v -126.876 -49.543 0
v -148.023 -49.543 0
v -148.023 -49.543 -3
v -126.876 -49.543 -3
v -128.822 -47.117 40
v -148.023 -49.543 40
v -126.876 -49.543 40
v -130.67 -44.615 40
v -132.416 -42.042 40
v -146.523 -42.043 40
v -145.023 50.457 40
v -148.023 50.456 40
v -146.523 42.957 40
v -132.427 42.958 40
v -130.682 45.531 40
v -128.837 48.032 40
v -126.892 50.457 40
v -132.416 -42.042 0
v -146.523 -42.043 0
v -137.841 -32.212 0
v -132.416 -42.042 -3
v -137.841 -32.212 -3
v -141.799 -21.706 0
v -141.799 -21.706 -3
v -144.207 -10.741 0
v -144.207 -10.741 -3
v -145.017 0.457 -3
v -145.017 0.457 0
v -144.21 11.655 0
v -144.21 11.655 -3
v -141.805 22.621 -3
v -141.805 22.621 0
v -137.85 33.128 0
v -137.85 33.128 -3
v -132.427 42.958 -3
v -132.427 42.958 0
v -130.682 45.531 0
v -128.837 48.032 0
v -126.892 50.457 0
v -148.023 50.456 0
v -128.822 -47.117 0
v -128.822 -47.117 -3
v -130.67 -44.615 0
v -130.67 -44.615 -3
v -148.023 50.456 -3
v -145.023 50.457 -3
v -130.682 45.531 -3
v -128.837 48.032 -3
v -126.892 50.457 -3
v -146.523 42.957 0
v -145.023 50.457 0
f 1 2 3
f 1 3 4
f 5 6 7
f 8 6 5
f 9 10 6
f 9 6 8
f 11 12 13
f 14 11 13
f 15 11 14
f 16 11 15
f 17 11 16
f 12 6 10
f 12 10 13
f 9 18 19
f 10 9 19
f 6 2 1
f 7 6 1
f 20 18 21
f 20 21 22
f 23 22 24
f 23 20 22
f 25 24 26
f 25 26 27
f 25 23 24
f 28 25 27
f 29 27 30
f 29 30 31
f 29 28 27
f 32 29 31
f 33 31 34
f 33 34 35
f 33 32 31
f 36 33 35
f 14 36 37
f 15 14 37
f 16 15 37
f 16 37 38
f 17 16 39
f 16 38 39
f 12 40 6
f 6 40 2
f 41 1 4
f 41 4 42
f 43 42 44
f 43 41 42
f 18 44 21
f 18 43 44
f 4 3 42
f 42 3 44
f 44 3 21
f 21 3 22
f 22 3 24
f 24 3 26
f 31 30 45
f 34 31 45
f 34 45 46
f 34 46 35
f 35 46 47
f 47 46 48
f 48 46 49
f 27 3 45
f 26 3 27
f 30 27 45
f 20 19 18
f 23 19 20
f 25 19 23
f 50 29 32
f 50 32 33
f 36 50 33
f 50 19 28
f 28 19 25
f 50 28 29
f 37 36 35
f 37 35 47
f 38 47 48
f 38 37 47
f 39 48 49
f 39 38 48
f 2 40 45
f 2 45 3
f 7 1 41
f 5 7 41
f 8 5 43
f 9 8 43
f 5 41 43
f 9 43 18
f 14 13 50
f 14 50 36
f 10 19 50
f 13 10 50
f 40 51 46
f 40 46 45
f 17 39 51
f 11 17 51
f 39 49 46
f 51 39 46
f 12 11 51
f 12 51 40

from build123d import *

# Parameters (mm, degrees)
F1_DEPTH = 3
F2_DEPTH = 40


with BuildPart() as f1:
    # F0 (on Top) → F1 (new body)
    with BuildSketch(Plane.XY):
        with BuildLine():
            Line((-126.8924768851, 50.456767044), (-145.0232239954, 50.456767044))
            Line((-145.0232239954, 50.456767044), (-146.5232239827, 50.4565720597))
            Line((-146.5232239827, 50.4565720597), (-146.5232239827, 42.9567671074))
            Line((-146.5232239827, 42.9567671074), (-132.4272471595, 42.958404326))
            ThreePointArc((-132.4272471595, 42.958404326), (-129.7719511525, 46.7903220915), (-126.8924768851, 50.456767044))
        make_face()
        Polygon((-146.5232239827, 42.9567671074), (-146.5232239827, 50.4565720597), (-148.02322397, 50.4563770754), (-148.02322397, -49.5432321111), (-146.5232239827, -49.5432321111), (-146.5232239827, -42.0432321745), align=None)
        with BuildLine():
            Line((-145.0102250409, -49.5432321111), (-126.8755409492, -49.5432321111))
            ThreePointArc((-126.8755409492, -49.5432321111), (-129.7580814774, -45.8752925216), (-132.4161980482, -42.0415949559))
            Line((-132.4161980482, -42.0415949559), (-146.5232239827, -42.0432321745))
            Line((-146.5232239827, -42.0432321745), (-146.5232239827, -49.5432321111))
            Line((-146.5232239827, -49.5432321111), (-145.0102250409, -49.5432321111))
        make_face()
        with BuildLine():
            ThreePointArc((-132.4161980482, -42.0415949559), (-145.0167245182, 0.4567674665), (-132.4272471595, 42.958404326))
            Line((-132.4272471595, 42.958404326), (-146.5232239827, 42.9567671074))
            Line((-146.5232239827, 42.9567671074), (-146.5232239827, -42.0432321745))
            Line((-146.5232239827, -42.0432321745), (-132.4161980482, -42.0415949559))
        make_face()
    extrude(amount=-F1_DEPTH)

    # F0 (on Top) → F2 (join)
    with BuildSketch(Plane.XY):
        with BuildLine():
            Line((-126.8924768851, 50.456767044), (-145.0232239954, 50.456767044))
            Line((-145.0232239954, 50.456767044), (-146.5232239827, 50.4565720597))
            Line((-146.5232239827, 50.4565720597), (-146.5232239827, 42.9567671074))
            Line((-146.5232239827, 42.9567671074), (-132.4272471595, 42.958404326))
            ThreePointArc((-132.4272471595, 42.958404326), (-129.7719511525, 46.7903220915), (-126.8924768851, 50.456767044))
        make_face()
        with BuildLine():
            Line((-145.0102250409, -49.5432321111), (-126.8755409492, -49.5432321111))
            ThreePointArc((-126.8755409492, -49.5432321111), (-129.7580814774, -45.8752925216), (-132.4161980482, -42.0415949559))
            Line((-132.4161980482, -42.0415949559), (-146.5232239827, -42.0432321745))
            Line((-146.5232239827, -42.0432321745), (-146.5232239827, -49.5432321111))
            Line((-146.5232239827, -49.5432321111), (-145.0102250409, -49.5432321111))
        make_face()
        Polygon((-146.5232239827, 42.9567671074), (-146.5232239827, 50.4565720597), (-148.02322397, 50.4563770754), (-148.02322397, -49.5432321111), (-146.5232239827, -49.5432321111), (-146.5232239827, -42.0432321745), align=None)
    extrude(amount=F2_DEPTH)


solid = f1.part
